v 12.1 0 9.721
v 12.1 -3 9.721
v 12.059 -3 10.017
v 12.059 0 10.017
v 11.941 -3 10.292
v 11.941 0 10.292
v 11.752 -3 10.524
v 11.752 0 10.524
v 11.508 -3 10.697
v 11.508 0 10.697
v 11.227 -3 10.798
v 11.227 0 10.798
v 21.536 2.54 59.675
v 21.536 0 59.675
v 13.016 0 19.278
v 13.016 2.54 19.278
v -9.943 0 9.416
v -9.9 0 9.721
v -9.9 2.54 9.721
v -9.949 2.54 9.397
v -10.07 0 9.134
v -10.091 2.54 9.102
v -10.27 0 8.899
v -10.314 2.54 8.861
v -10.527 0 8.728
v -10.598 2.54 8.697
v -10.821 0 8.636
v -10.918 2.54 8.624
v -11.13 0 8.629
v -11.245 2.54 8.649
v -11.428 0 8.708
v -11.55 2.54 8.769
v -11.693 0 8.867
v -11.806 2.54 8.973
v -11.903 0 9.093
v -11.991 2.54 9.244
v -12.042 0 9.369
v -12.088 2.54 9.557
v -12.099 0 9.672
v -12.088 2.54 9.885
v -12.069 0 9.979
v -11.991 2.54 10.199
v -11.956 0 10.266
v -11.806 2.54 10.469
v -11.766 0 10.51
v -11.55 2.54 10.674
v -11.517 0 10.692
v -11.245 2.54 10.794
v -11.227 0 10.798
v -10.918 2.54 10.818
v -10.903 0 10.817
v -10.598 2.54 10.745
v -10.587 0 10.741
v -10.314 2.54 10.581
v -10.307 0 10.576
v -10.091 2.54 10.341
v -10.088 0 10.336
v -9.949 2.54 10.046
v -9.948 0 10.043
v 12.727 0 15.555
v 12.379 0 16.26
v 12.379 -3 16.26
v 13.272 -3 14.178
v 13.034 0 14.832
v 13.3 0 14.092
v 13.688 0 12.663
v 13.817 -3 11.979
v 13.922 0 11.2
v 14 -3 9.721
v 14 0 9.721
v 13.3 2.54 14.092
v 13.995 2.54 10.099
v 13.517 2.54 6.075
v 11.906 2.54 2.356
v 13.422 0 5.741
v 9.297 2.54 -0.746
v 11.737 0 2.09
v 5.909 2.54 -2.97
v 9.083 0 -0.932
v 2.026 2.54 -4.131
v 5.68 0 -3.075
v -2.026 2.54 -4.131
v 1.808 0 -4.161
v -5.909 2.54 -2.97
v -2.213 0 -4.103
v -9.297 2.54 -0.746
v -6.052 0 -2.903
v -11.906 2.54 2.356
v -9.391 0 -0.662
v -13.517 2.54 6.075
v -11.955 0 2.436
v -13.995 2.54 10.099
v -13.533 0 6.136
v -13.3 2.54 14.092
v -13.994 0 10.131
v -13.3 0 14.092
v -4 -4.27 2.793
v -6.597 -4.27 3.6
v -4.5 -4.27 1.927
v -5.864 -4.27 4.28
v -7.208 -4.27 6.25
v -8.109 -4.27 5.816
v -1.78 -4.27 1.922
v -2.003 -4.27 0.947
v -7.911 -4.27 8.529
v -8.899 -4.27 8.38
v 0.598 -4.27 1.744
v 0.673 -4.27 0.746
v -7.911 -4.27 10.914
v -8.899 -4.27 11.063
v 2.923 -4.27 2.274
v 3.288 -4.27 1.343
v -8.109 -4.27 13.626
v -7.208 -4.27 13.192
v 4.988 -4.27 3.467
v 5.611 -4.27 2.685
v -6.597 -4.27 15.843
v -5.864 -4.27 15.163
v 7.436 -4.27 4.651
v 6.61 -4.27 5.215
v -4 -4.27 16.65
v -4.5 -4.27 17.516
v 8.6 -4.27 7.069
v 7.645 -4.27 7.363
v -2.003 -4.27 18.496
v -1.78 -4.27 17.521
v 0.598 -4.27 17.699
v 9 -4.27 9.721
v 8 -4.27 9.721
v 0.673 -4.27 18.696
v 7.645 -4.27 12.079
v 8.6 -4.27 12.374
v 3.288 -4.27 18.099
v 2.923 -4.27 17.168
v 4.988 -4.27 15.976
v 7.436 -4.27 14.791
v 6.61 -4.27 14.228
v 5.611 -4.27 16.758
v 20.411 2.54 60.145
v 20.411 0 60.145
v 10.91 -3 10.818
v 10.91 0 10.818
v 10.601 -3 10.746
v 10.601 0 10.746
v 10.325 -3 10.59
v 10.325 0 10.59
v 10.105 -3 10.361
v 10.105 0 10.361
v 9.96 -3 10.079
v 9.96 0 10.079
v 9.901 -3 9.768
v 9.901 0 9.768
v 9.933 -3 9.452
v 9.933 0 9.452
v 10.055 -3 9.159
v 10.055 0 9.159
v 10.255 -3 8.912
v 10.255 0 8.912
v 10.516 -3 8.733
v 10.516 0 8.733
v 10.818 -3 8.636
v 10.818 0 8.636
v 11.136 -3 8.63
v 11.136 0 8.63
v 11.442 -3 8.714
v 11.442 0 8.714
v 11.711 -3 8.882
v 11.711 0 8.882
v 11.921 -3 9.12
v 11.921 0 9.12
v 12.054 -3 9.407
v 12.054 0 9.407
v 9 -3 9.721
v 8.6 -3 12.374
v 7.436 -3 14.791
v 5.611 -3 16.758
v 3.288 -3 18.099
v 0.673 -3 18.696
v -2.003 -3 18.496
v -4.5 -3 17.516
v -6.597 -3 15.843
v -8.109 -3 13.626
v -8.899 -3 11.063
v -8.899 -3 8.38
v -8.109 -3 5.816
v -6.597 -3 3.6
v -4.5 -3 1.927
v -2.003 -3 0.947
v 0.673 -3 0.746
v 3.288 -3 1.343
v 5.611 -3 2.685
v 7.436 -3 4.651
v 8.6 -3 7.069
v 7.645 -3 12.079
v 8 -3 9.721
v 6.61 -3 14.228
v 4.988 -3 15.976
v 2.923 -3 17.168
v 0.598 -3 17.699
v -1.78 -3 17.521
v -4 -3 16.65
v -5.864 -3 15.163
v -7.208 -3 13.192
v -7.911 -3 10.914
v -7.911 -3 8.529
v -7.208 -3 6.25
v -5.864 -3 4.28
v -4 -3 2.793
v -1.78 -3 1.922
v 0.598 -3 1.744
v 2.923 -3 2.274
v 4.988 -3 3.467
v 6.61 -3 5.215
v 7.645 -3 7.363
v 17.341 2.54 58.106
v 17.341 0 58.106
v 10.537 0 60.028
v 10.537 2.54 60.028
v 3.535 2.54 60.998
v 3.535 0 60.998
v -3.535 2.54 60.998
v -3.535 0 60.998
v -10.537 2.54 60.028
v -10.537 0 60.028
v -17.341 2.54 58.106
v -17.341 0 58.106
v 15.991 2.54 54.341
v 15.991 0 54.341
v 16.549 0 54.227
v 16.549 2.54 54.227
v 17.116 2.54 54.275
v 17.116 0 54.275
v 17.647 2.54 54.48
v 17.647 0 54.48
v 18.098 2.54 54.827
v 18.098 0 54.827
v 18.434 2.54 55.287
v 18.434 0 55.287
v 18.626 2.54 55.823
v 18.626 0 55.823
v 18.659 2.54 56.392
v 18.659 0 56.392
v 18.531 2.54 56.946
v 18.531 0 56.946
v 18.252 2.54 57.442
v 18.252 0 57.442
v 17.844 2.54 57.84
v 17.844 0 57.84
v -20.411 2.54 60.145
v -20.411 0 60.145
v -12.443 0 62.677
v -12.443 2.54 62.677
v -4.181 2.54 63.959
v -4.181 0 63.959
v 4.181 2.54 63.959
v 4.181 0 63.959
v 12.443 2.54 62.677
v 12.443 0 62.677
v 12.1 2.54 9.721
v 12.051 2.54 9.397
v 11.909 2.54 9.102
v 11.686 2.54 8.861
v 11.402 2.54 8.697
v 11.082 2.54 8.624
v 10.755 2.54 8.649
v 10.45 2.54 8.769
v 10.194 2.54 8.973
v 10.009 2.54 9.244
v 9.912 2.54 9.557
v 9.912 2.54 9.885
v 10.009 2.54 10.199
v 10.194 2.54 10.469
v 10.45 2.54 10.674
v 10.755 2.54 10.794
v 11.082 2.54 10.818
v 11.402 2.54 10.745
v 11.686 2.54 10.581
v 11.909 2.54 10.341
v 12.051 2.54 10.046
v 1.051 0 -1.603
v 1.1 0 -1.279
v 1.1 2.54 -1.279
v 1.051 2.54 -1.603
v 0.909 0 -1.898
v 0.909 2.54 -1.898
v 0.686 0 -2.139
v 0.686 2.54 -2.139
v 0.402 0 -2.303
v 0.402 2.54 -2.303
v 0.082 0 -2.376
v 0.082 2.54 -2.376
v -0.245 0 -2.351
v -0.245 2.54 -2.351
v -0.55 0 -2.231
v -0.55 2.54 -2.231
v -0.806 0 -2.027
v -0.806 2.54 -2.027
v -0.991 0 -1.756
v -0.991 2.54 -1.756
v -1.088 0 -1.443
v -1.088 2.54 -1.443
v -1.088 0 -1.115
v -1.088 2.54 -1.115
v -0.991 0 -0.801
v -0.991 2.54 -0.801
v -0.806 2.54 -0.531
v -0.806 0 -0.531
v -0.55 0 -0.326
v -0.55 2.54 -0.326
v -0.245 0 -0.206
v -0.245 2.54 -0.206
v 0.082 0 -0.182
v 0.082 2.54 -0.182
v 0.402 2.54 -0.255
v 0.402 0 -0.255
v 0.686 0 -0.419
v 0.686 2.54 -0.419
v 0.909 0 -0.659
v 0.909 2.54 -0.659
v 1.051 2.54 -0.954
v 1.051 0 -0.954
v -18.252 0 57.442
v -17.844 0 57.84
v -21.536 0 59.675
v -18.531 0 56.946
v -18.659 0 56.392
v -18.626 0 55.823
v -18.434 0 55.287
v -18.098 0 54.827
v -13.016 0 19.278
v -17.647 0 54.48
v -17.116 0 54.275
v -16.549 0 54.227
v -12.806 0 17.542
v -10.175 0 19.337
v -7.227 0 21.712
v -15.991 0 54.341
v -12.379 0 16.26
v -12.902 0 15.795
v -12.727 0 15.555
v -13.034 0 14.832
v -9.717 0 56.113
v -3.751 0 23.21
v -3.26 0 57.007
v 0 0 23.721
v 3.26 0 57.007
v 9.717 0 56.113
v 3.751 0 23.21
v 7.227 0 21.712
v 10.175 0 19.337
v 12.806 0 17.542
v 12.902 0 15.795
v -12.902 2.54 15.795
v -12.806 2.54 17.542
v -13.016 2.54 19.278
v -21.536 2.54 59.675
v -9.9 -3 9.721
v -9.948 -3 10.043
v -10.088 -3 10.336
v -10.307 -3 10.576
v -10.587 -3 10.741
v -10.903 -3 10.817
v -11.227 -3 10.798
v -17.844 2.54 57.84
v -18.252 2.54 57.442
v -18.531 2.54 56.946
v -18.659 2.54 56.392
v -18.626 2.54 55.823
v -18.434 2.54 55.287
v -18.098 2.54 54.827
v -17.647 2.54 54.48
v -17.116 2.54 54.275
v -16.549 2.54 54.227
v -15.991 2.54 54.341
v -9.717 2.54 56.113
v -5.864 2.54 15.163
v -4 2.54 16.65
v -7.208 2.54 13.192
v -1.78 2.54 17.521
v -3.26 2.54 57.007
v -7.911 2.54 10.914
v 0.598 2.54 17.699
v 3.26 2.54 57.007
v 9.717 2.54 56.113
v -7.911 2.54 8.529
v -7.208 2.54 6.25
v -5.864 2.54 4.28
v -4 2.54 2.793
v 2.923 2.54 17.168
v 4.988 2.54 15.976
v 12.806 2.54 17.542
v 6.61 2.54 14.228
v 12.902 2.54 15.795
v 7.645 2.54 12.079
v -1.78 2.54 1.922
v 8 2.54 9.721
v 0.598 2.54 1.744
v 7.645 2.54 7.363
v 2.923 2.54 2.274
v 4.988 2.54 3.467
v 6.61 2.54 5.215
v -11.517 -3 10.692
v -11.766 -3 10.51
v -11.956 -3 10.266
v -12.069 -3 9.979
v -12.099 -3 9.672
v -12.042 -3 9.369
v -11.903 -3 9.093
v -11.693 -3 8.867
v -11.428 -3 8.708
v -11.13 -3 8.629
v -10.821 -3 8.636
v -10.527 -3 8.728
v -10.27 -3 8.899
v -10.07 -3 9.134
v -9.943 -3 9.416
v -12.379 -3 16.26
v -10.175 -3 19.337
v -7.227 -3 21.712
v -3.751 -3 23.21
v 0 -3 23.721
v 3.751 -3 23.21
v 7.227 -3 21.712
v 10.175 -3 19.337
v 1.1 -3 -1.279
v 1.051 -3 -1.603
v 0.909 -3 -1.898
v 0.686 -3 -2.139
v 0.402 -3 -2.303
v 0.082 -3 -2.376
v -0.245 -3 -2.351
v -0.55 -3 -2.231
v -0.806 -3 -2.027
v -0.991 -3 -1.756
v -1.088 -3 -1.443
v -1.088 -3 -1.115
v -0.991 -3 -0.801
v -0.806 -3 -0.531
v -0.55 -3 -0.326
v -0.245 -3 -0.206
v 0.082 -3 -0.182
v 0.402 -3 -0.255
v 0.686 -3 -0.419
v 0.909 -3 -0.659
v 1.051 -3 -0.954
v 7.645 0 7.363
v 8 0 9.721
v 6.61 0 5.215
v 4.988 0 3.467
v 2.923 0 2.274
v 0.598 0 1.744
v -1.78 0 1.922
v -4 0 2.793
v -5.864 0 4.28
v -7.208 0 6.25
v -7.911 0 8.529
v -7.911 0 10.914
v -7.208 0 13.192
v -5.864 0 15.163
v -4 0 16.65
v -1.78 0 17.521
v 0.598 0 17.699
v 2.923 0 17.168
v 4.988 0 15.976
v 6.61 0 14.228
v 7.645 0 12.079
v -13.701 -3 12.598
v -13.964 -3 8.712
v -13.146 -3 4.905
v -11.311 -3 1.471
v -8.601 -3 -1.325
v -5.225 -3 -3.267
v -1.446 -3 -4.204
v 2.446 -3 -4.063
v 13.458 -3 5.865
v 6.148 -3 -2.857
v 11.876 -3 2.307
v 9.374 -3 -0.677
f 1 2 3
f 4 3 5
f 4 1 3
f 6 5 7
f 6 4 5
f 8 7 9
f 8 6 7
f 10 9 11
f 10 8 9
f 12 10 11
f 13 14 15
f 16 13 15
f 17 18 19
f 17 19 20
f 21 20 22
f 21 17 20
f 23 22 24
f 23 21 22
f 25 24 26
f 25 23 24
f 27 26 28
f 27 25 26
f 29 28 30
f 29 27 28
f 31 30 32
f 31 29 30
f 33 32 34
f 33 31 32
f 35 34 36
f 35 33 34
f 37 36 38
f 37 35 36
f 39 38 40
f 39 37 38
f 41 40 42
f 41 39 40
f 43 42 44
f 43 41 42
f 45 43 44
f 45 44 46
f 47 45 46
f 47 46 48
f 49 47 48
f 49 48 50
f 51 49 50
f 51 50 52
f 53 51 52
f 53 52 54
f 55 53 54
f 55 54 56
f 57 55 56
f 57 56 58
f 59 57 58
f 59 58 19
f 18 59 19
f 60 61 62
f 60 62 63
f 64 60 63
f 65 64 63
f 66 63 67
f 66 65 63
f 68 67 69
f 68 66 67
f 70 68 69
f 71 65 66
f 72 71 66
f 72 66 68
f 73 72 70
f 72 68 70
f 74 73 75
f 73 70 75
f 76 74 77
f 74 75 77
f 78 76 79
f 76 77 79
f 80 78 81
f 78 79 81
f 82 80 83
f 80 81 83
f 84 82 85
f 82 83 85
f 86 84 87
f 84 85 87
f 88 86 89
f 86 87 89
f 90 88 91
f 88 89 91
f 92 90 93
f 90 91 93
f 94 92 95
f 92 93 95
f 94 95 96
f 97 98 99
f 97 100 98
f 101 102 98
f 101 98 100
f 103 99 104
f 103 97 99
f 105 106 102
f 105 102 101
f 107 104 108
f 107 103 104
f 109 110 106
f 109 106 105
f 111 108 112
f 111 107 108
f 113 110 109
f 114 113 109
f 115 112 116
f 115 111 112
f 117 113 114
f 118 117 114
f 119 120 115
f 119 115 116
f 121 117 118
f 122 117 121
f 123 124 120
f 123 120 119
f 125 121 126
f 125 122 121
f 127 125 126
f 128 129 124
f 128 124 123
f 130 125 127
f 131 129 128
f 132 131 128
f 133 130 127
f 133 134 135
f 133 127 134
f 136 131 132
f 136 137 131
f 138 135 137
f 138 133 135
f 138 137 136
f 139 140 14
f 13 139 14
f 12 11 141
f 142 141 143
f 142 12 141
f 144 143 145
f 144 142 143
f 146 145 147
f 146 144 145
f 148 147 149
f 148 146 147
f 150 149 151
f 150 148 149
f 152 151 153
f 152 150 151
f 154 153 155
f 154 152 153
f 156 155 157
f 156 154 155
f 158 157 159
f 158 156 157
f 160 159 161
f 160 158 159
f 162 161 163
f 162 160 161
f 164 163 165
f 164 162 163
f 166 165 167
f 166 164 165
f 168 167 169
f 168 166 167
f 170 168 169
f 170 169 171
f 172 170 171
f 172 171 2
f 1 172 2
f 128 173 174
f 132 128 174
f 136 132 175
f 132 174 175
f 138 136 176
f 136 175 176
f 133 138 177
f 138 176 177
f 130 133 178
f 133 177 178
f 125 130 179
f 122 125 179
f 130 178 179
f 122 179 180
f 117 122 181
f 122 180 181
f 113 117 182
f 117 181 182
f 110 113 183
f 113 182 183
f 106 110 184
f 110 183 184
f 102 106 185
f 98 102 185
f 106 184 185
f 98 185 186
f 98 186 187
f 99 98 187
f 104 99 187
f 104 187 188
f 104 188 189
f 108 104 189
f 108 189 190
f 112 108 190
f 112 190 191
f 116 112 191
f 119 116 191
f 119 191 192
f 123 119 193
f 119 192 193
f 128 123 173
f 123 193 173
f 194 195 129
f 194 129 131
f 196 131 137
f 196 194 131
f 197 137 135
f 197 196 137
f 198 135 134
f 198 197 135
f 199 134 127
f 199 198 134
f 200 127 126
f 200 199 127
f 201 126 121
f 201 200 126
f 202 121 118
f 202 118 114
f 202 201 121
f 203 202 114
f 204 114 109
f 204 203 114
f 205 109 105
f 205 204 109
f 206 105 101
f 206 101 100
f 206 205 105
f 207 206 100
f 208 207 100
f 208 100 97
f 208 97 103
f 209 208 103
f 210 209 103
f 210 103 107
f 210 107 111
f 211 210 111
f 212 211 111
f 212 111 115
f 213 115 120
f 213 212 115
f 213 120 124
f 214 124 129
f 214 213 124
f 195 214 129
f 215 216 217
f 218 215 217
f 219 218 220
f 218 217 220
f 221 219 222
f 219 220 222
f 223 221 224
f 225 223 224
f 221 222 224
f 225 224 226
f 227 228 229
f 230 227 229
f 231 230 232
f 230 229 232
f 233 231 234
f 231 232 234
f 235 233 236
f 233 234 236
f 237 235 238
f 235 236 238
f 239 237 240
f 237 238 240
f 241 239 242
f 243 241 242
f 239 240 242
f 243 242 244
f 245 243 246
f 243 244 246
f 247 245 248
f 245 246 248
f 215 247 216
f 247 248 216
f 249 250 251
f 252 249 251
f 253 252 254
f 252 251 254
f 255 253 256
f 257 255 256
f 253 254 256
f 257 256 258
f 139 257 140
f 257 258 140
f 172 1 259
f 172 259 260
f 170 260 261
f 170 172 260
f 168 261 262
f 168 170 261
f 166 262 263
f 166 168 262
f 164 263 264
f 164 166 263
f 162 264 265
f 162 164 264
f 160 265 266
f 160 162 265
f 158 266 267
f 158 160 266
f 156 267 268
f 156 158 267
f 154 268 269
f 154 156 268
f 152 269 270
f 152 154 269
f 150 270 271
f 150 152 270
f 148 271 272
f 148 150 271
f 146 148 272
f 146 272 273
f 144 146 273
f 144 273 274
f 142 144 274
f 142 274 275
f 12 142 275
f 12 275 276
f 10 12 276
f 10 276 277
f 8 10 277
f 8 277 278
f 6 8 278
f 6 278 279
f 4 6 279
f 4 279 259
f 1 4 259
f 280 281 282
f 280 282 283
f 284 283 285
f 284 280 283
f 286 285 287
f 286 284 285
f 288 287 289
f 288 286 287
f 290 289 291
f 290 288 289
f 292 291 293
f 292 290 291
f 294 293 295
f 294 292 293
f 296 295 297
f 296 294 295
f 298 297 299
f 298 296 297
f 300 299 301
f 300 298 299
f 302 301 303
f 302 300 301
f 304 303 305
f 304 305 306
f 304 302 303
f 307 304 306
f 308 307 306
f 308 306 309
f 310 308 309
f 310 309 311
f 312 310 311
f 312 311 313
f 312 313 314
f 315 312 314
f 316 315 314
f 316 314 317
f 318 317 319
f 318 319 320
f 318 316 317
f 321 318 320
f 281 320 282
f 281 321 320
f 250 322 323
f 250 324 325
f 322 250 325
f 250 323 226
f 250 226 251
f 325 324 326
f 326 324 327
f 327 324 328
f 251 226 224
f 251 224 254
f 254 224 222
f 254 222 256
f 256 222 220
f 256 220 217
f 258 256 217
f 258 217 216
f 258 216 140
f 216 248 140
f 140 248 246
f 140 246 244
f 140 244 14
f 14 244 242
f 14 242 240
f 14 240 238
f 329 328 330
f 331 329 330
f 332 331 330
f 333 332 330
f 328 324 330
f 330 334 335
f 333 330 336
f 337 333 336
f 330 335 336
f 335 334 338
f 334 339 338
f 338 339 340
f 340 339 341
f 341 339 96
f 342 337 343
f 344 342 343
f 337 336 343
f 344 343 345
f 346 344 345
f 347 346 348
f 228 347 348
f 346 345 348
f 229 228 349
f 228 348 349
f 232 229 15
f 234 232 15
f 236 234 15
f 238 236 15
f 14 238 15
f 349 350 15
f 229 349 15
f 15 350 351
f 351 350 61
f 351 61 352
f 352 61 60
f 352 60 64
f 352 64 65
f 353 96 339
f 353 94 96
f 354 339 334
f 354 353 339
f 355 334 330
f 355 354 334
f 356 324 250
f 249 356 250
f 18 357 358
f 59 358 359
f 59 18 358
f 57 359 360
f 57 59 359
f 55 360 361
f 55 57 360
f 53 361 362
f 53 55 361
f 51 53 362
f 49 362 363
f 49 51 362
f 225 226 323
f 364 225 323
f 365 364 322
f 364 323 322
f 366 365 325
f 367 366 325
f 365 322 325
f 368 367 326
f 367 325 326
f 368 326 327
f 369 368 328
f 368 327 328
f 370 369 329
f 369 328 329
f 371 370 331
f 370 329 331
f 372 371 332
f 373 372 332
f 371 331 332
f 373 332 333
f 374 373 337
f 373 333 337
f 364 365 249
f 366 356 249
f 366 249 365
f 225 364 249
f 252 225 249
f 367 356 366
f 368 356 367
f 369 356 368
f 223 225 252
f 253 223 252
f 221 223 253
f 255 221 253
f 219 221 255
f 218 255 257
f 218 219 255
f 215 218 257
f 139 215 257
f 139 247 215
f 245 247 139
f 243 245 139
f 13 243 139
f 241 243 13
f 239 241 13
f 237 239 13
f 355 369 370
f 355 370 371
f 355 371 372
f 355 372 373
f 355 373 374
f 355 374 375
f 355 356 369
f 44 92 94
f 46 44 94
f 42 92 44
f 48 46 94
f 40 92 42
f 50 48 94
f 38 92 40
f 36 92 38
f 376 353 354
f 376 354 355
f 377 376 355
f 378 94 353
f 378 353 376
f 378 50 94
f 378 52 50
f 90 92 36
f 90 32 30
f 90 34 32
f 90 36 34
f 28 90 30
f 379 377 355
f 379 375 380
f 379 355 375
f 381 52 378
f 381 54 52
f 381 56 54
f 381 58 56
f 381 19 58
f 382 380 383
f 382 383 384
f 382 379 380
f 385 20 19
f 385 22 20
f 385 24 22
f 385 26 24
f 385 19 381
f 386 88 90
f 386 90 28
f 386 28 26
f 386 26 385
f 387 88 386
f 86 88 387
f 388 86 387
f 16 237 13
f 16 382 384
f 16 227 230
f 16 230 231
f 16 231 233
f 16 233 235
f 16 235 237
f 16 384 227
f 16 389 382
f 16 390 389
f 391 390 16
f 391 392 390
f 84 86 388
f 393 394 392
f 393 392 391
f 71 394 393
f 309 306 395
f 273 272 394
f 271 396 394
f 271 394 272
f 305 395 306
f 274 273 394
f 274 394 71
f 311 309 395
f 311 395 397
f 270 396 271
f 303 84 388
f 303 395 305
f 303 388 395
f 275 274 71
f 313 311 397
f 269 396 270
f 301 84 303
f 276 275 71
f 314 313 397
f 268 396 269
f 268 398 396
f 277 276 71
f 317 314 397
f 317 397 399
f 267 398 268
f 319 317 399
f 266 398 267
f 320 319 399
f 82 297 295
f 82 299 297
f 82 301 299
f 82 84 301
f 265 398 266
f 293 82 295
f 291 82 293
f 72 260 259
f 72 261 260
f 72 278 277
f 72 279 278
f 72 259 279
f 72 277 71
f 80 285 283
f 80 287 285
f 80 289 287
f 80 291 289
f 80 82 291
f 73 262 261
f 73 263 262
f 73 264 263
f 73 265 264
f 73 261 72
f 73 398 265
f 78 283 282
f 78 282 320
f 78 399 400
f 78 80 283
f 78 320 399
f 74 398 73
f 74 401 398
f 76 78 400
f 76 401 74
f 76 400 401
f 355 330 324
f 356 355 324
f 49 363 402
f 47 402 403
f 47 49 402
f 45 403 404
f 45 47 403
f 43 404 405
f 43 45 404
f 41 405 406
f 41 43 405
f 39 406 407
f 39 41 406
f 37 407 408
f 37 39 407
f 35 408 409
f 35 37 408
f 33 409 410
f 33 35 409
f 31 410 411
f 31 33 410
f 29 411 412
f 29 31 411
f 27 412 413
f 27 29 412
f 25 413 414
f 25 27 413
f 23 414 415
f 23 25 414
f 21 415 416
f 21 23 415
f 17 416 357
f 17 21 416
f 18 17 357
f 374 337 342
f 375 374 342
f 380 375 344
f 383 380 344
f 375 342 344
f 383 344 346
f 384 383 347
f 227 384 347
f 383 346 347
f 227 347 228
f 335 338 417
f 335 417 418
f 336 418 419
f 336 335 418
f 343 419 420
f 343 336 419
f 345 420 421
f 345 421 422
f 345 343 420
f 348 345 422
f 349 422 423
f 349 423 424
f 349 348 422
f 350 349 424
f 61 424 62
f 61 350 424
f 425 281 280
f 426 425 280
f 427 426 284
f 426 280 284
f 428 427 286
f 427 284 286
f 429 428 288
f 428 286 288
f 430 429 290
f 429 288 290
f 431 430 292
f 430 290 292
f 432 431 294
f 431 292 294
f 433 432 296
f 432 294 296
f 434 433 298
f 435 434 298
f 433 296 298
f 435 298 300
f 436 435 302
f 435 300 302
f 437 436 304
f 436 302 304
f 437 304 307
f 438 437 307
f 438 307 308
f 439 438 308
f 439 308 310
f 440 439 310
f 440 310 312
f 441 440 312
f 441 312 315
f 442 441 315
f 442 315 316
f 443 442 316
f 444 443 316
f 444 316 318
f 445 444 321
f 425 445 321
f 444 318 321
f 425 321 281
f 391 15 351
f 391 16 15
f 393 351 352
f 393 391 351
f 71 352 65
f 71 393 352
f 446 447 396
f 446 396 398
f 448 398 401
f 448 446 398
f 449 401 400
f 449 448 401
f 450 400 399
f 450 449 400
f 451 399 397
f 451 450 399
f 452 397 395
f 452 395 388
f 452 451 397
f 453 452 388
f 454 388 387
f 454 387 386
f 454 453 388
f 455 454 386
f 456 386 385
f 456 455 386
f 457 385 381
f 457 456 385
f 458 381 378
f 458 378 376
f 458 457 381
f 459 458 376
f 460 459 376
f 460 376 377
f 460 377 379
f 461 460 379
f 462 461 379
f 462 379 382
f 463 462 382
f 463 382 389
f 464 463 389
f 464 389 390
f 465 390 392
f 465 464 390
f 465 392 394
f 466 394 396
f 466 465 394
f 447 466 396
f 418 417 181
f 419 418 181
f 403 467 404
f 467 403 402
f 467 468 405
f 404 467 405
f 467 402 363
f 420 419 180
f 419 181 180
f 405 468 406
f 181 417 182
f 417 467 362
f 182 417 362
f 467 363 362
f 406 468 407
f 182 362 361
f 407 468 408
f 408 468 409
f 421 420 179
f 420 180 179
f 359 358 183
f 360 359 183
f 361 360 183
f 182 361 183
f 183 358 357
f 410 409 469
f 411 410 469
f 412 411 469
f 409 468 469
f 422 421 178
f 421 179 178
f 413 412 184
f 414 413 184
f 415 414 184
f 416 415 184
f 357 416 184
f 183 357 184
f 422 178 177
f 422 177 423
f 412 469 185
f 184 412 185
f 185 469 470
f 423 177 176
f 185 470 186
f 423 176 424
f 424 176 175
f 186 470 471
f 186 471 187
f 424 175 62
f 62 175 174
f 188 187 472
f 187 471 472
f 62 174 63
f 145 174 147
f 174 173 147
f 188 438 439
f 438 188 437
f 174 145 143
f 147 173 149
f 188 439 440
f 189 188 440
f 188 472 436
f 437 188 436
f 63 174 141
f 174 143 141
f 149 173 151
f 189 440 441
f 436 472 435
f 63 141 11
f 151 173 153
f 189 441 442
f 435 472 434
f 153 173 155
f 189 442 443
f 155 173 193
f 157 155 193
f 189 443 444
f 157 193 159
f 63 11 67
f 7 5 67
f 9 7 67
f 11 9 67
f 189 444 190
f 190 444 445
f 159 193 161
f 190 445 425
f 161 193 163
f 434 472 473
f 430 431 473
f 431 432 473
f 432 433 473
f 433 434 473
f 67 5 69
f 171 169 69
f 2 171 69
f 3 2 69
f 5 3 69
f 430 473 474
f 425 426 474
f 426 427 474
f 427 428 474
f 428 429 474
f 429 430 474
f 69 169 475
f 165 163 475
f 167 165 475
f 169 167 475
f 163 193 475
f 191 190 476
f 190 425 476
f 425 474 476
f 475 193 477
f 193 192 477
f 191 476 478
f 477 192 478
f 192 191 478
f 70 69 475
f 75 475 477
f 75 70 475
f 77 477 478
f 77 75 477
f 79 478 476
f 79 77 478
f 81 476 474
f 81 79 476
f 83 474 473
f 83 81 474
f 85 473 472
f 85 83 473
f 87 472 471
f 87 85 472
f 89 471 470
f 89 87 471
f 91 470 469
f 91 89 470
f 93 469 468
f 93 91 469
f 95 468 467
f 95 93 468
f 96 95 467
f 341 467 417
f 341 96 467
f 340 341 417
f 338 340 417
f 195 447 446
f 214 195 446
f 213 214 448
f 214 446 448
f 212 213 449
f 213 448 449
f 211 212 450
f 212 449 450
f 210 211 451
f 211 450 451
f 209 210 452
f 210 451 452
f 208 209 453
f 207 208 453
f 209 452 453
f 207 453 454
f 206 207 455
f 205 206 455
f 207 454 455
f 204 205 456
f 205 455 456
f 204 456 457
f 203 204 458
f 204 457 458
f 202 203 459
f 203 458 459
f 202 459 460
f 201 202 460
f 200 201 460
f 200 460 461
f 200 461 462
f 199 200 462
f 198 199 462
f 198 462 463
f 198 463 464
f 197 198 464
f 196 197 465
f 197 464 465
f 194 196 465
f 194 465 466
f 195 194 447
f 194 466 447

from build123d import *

# Parameters (mm, degrees)
SKETCH1_R           = 1.1
SKETCH1_R_2         = 8
BOSS_EXTRUDE1_DEPTH = 2.54
FILLET2_R           = 10
BOSS_EXTRUDE2_START = -2.999994
SKETCH1_4_R         = 8
SKETCH1_4_R_2       = 1.1
BOSS_EXTRUDE2_DEPTH = 2.999994
BOSS_EXTRUDE3_START = 1.27
SKETCH2_R           = 9
SKETCH2_R_2         = 8
BOSS_EXTRUDE3_DEPTH = 1.27


with BuildPart() as part:
    # Sketch1 → Boss-Extrude1 (new body)
    with BuildSketch(Plane(origin=(0, 0, 0), x_dir=(1, 0, 0), z_dir=(0, 1, 0))):
        with BuildLine():
            Line((20.411129853, -60.145086441), (21.536156884, -59.674942586))
            Line((21.536156884, -59.674942586), (12.379162196, -16.260133485))
            ThreePointArc((12.379162196, -16.260133485), (0, 4.278699998), (-12.379162196, -16.260133485))
            Line((-12.379162196, -16.260133485), (-21.536156884, -59.674942586))
            Line((-21.536156884, -59.674942586), (-20.411129853, -60.145086441))
            ThreePointArc((-20.411129853, -60.145086441), (0, -64.119576268), (20.411129853, -60.145086441))
        make_face()
        with BuildLine():
            ThreePointArc((-17.340734757, -58.10602614), (-18.548712659, -55.548529546), (-15.99121608, -54.340551611))
            ThreePointArc((-15.99121608, -54.340551611), (-6.8e-08, -57.119576403), (15.991215951, -54.340551657))
            ThreePointArc((15.991215951, -54.340551657), (18.548712618, -55.548529433), (17.340734853, -58.106026106))
            ThreePointArc((17.340734853, -58.106026106), (5.1e-08, -61.11957629), (-17.340734757, -58.10602614))
        make_face(mode=Mode.SUBTRACT)
        with Locations((-11, -9.721300002)):
            Circle(SKETCH1_R, mode=Mode.SUBTRACT)
        with Locations((0, -9.721300002)):
            Circle(SKETCH1_R_2, mode=Mode.SUBTRACT)
        with Locations((0, 1.278699998)):
            Circle(SKETCH1_R, mode=Mode.SUBTRACT)
        with Locations((11, -9.721300002)):
            Circle(SKETCH1_R, mode=Mode.SUBTRACT)
    extrude(amount=BOSS_EXTRUDE1_DEPTH)

    # Fillet2
    fillet2_edges = [part.edges().sort_by_distance(p)[0] for p in [
        (-12.379162196, 1.27, 16.260133485),
        (12.379162196, 1.27, 16.260133485),
    ]]
    fillet(fillet2_edges, radius=FILLET2_R)

    # Sketch1<4> → Boss-Extrude2 (add)
    with BuildSketch(Plane(origin=(0, 0, 0), x_dir=(1, 0, 0), z_dir=(0, 1, 0)).offset(BOSS_EXTRUDE2_START)):
        with BuildLine():
            ThreePointArc((-12.379162196, -16.260133485), (0, -23.721300002), (12.379162196, -16.260133485))
            ThreePointArc((12.379162196, -16.260133485), (13.588750324, -13.089662308), (14, -9.721300002))
            ThreePointArc((14, -9.721300002), (-3.368362306, 3.867450323), (-12.379162196, -16.260133485))
        make_face()
        with BuildLine():
            ThreePointArc((-9.9, -9.721300002), (-10.307077747, -10.575617712), (-11.22701591, -10.797619553))
            ThreePointArc((-11.22701591, -10.797619553), (-11.692922253, -8.866982291), (-9.9, -9.721300002))
        make_face(mode=Mode.SUBTRACT)
        with Locations((0, -9.721300002)):
            Circle(SKETCH1_4_R, mode=Mode.SUBTRACT)
        with Locations((0, 1.278699998)):
            Circle(SKETCH1_4_R_2, mode=Mode.SUBTRACT)
        with BuildLine():
            ThreePointArc((12.1, -9.721300002), (11.854317711, -10.414222255), (11.22701591, -10.797619553))
            ThreePointArc((11.22701591, -10.797619553), (10.145682289, -9.028377748), (12.1, -9.721300002))
        make_face(mode=Mode.SUBTRACT)
    extrude(amount=BOSS_EXTRUDE2_DEPTH)

    # Sketch2 → Boss-Extrude3 (add)
    with BuildSketch(Plane.XZ.offset(2.999994).offset(BOSS_EXTRUDE3_START)):
        with Locations((0, 9.721300002)):
            Circle(SKETCH2_R)
        with Locations((0, 9.721300002)):
            Circle(SKETCH2_R_2, mode=Mode.SUBTRACT)
    extrude(amount=-BOSS_EXTRUDE3_DEPTH)


solid = part.part
